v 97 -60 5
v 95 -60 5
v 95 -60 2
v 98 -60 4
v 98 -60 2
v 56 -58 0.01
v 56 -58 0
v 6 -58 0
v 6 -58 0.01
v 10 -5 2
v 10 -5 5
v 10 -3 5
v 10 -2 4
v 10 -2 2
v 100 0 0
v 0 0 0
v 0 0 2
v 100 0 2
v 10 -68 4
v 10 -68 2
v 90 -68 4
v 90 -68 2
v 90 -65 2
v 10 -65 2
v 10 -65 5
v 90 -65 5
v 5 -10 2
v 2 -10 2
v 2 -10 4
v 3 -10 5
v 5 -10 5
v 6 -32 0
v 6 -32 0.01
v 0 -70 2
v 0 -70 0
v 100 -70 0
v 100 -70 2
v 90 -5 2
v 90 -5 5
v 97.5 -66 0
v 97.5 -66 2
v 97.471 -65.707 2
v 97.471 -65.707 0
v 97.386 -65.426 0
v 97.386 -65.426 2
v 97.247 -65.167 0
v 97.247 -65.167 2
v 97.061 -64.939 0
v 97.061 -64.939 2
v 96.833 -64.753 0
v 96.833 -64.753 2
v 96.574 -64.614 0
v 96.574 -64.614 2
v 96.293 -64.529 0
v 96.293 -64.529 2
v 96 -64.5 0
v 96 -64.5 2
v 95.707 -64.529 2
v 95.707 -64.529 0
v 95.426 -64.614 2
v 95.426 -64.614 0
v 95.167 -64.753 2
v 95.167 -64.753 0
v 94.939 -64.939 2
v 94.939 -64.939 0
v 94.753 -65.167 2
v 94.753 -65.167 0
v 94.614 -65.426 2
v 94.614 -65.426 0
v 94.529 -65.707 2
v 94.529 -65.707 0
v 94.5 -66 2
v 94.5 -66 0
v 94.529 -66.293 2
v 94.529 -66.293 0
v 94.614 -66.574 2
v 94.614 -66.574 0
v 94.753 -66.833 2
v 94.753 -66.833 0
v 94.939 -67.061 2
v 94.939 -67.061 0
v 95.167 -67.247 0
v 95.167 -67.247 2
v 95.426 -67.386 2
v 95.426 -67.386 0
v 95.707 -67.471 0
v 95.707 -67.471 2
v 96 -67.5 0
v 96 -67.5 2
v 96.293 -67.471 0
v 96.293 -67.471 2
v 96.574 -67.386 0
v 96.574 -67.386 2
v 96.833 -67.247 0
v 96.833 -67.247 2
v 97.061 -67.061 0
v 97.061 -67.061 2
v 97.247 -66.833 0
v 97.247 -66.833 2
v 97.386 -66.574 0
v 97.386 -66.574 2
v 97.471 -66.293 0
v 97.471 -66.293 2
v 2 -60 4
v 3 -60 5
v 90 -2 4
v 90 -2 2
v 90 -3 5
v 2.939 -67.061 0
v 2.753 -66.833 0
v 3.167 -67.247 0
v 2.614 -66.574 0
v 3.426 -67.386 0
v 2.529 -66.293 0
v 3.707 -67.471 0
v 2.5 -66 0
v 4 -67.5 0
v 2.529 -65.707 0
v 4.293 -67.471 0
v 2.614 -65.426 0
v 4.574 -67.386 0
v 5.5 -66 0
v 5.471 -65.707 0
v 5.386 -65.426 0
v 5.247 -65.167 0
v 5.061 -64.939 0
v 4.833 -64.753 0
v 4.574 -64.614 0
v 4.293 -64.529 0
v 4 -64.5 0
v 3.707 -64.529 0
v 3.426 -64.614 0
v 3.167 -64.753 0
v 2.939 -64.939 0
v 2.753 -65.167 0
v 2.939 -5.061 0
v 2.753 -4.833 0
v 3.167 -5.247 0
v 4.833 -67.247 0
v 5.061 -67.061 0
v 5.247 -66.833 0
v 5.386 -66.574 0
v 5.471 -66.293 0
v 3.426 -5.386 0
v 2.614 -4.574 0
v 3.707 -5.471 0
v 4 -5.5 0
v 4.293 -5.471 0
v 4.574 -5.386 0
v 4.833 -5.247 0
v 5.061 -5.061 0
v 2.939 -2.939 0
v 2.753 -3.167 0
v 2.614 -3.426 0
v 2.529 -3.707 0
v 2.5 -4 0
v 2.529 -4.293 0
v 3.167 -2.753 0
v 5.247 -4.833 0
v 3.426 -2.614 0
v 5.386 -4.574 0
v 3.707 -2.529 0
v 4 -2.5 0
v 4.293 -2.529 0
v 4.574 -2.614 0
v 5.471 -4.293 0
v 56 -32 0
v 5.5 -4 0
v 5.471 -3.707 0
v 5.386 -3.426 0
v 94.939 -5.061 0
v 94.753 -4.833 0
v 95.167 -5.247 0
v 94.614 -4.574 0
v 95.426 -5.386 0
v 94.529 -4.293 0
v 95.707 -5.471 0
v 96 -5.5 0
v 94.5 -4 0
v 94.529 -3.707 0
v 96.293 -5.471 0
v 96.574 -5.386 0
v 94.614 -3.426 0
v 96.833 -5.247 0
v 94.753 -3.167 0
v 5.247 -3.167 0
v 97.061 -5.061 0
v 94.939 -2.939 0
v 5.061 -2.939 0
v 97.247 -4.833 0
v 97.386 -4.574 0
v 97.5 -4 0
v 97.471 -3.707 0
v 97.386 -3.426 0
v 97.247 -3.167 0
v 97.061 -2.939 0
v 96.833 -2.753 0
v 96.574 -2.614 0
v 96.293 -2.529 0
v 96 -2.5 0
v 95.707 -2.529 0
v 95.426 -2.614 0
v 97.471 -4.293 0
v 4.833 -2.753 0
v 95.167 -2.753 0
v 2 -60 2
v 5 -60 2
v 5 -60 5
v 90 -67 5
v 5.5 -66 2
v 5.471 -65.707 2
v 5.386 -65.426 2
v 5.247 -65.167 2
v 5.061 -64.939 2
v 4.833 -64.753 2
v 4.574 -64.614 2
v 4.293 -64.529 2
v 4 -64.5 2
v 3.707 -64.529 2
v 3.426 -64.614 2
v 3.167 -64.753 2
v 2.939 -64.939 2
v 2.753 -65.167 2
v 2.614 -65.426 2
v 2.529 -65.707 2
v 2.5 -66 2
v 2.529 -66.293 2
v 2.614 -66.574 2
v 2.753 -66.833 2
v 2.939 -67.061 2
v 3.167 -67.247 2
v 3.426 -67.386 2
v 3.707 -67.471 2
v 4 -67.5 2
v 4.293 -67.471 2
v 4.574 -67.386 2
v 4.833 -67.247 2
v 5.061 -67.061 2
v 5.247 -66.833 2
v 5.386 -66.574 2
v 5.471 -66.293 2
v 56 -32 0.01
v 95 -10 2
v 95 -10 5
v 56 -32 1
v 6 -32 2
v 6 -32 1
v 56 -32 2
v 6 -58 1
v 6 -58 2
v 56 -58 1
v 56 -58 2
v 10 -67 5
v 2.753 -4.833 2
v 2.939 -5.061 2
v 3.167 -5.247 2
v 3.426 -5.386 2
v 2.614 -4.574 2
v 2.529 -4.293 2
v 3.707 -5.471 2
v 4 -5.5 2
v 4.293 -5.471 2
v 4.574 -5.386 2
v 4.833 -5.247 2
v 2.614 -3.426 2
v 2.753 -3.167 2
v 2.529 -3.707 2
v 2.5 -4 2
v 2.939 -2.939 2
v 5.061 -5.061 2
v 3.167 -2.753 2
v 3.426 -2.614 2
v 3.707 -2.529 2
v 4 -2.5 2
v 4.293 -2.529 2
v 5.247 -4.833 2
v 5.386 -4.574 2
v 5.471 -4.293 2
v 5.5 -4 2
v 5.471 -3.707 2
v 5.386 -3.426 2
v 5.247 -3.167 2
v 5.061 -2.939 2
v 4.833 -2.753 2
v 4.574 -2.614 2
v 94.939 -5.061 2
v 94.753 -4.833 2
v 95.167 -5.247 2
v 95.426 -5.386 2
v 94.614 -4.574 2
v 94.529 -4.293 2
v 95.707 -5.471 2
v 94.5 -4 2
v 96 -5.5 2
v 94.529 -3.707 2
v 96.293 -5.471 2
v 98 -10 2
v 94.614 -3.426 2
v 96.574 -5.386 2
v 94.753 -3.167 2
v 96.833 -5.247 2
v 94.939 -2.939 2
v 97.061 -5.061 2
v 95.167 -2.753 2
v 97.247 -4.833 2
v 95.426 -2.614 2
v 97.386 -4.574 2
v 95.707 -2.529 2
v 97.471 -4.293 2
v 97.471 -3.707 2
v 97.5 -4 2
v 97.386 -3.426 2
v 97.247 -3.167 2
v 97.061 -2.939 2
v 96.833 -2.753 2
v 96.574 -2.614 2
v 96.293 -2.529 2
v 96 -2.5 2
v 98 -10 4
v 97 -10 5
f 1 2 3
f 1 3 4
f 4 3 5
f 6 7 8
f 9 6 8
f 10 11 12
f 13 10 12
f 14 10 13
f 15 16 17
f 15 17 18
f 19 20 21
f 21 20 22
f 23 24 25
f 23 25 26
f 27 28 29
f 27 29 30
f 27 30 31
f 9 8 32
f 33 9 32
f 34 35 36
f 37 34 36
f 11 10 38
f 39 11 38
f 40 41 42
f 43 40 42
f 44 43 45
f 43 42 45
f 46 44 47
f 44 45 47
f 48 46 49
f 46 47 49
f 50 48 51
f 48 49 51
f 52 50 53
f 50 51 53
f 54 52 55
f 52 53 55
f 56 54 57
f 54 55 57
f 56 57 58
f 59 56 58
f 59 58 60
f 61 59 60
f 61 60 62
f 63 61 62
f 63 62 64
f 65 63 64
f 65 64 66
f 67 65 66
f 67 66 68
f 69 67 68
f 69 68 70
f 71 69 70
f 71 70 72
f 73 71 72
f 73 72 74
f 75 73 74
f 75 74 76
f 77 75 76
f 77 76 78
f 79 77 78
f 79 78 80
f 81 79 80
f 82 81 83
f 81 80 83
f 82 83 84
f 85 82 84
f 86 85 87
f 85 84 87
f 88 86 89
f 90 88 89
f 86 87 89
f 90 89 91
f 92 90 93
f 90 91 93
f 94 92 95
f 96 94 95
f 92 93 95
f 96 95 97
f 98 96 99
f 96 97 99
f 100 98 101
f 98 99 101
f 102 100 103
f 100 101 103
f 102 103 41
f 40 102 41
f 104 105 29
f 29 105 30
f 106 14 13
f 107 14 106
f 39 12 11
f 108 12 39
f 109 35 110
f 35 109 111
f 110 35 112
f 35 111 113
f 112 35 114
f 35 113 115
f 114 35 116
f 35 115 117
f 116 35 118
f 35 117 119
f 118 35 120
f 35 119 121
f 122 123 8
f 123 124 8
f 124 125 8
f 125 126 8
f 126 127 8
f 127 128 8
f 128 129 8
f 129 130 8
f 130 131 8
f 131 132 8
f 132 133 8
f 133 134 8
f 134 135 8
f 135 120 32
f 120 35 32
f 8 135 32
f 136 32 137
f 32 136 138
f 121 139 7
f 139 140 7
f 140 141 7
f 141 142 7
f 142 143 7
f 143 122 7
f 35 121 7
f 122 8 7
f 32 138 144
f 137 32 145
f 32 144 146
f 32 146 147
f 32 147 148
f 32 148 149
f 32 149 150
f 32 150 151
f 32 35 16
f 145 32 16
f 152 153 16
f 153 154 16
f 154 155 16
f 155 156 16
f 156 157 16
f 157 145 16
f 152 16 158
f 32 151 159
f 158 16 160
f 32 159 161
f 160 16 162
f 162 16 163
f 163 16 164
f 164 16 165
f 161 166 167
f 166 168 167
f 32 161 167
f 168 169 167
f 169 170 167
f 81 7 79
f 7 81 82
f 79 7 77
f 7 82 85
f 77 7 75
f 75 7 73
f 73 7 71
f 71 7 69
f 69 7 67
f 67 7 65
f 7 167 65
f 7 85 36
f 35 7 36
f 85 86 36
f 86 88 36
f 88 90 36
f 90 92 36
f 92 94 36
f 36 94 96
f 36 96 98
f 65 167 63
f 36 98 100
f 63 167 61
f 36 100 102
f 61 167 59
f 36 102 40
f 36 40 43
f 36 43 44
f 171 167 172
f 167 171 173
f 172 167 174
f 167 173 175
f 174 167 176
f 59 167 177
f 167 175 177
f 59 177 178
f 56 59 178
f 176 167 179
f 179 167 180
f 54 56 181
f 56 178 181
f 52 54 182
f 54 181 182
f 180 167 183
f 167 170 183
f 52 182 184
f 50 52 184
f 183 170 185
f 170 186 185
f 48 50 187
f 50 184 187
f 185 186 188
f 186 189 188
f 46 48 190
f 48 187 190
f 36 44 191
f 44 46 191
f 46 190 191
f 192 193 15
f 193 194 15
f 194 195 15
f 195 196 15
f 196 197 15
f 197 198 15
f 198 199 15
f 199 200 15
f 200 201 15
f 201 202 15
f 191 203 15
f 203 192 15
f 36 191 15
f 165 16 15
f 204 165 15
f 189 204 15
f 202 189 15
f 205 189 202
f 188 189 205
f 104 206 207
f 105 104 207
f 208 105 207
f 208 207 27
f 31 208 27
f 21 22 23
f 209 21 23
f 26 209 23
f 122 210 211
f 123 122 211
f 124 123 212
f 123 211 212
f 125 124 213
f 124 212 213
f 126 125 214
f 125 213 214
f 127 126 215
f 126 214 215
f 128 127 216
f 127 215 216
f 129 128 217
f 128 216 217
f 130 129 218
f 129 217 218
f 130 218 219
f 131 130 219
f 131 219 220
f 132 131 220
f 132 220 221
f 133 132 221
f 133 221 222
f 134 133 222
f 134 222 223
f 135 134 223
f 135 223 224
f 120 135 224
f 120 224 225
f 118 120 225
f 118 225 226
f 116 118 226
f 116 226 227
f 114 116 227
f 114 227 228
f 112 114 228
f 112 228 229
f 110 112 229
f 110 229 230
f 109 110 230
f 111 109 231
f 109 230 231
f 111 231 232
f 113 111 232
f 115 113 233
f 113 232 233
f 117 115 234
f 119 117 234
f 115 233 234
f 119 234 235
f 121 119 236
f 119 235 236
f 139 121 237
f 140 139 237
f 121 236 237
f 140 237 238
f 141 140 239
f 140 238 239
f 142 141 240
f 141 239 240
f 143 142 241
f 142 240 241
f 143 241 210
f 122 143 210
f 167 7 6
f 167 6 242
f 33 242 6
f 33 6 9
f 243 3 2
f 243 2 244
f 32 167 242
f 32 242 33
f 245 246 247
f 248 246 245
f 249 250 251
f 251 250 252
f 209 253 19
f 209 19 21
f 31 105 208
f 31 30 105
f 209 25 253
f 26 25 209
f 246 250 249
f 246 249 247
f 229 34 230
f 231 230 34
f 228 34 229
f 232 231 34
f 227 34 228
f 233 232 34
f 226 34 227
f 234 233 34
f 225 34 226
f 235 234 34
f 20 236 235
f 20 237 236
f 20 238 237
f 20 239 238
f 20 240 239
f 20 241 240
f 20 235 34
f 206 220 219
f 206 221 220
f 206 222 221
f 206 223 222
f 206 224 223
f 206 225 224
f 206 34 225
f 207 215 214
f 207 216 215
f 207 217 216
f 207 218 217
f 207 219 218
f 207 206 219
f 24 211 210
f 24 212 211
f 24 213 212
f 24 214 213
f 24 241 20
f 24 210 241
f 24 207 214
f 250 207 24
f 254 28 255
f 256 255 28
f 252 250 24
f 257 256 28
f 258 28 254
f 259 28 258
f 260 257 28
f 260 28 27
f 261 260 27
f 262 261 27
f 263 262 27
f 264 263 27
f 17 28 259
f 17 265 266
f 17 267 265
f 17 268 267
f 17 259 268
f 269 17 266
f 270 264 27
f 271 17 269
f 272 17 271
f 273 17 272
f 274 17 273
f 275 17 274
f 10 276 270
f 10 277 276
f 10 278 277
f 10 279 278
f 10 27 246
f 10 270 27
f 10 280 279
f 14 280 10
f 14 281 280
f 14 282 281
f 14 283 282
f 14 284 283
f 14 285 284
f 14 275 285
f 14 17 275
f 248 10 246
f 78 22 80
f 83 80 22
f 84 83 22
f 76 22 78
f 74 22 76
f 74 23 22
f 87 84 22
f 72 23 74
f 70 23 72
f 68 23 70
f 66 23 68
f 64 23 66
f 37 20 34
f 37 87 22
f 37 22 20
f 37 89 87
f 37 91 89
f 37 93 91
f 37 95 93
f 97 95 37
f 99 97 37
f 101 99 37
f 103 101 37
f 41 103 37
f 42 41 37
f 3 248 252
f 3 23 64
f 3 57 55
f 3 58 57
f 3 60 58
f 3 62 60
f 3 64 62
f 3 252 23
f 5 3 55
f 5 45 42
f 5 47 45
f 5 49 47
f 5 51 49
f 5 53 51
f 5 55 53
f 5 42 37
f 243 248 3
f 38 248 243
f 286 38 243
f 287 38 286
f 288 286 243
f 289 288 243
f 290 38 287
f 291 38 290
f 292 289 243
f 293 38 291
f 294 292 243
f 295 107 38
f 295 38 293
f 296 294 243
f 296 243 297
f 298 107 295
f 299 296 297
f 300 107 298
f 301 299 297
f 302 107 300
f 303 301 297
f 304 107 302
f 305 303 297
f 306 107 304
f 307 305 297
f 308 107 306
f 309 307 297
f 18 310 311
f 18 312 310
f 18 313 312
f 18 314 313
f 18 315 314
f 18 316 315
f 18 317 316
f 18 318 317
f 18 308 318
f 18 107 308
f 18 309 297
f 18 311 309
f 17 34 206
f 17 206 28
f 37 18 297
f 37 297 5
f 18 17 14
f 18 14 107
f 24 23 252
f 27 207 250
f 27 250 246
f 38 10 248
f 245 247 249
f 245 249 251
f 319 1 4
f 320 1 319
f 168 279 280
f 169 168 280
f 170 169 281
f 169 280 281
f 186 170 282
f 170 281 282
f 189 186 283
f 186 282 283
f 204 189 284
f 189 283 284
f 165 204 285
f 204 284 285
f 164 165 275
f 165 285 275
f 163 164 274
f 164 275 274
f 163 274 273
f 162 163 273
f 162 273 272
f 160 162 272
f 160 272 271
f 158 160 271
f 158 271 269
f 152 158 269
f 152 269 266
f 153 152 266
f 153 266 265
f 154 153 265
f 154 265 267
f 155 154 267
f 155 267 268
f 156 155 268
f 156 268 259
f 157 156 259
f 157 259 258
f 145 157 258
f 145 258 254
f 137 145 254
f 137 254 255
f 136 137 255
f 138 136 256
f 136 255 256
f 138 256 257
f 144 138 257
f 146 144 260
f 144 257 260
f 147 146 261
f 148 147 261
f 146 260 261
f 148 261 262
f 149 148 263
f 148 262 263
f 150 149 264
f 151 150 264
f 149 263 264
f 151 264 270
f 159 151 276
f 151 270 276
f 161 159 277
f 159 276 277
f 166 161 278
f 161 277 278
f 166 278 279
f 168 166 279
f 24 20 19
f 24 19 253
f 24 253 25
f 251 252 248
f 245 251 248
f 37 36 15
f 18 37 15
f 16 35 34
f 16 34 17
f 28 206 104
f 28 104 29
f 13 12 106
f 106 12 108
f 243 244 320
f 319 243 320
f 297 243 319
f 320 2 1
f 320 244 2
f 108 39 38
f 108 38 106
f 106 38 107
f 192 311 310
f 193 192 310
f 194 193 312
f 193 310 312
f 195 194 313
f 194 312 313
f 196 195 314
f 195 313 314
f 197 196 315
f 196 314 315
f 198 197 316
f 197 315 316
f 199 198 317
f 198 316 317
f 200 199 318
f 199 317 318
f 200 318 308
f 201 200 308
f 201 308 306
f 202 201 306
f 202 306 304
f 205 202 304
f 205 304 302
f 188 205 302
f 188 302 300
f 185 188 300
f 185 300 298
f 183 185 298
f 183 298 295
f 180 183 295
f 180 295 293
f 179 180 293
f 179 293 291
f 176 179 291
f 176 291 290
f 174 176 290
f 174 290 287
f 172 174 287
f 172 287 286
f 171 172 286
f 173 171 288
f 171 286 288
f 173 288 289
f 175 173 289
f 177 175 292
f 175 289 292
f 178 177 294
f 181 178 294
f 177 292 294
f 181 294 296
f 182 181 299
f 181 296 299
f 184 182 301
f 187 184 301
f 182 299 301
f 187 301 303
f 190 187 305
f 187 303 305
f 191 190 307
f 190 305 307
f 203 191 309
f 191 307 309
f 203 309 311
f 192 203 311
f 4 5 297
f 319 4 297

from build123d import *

# Parameters (mm, degrees)
SKIZZE1_W                       = 100
SKIZZE1_H                       = 70
AUFSATZ_LINEAR_AUSTRAGEN1_DEPTH = 2
SKIZZE2_W                       = 80
SKIZZE2_H                       = 3
SKIZZE2_W_2                     = 3
SKIZZE2_H_2                     = 50
AUFSATZ_LINEAR_AUSTRAGEN2_DEPTH = 3
FASE1_SIZE                      = 1
SKIZZE3_R                       = 1.5
SCHNITT_LINEAR_AUSTRAGEN1_DEPTH = 123.102416029
SKIZZE4_W                       = 50
SKIZZE4_H                       = 26
SCHNITT_LINEAR_AUSTRAGEN2_DEPTH = 0.01
SKIZZE6_W                       = 50
SKIZZE6_H                       = 26
SCHNITT_LINEAR_AUSTRAGEN3_DEPTH = 1


with BuildPart() as part:
    # Skizze1 → Aufsatz-Linear austragen1 (new body)
    with BuildSketch(Plane.XY):
        with Locations((50, -35)):
            Rectangle(SKIZZE1_W, SKIZZE1_H)
    extrude(amount=AUFSATZ_LINEAR_AUSTRAGEN1_DEPTH)

    # Skizze2 → Aufsatz-Linear austragen2 (add)
    with BuildSketch(Plane.XY.offset(2)):
        with Locations((50, -3.5)):
            Rectangle(SKIZZE2_W, SKIZZE2_H)
        with Locations((50, -66.5)):
            Rectangle(SKIZZE2_W, SKIZZE2_H)
        with Locations((96.5, -35)):
            Rectangle(SKIZZE2_W_2, SKIZZE2_H_2)
        with Locations((3.5, -35)):
            Rectangle(SKIZZE2_W_2, SKIZZE2_H_2)
    extrude(amount=AUFSATZ_LINEAR_AUSTRAGEN2_DEPTH)

    # Fase1
    fase1_edges = [part.edges().sort_by_distance(p)[0] for p in [
        (50, -2, 5),
        (50, -68, 5),
        (98, -35, 5),
        (2, -35, 5),
    ]]
    chamfer(fase1_edges, length=FASE1_SIZE)

    # Skizze3 → Schnitt-Linear austragen1 (cut, through all)
    with BuildSketch(Plane.XY.offset(2)):
        with Locations((4, -4)):
            Circle(SKIZZE3_R)
        with Locations((96, -4)):
            Circle(SKIZZE3_R)
        with Locations((96, -66)):
            Circle(SKIZZE3_R)
        with Locations((4, -66)):
            Circle(SKIZZE3_R)
    extrude(amount=-SCHNITT_LINEAR_AUSTRAGEN1_DEPTH, mode=Mode.SUBTRACT)

    # Skizze4 → Schnitt-Linear austragen2 (cut)
    with BuildSketch(Plane(origin=(0, 0, 0), x_dir=(-1, 0, 0), z_dir=(0, 0, -1))):
        with Locations((-31, -45)):
            Rectangle(SKIZZE4_W, SKIZZE4_H)
    extrude(amount=-SCHNITT_LINEAR_AUSTRAGEN2_DEPTH, mode=Mode.SUBTRACT)

    # Skizze6 → Schnitt-Linear austragen3 (cut)
    with BuildSketch(Plane.XY.offset(2)):
        with Locations((31, -45)):
            Rectangle(SKIZZE6_W, SKIZZE6_H)
    extrude(amount=-SCHNITT_LINEAR_AUSTRAGEN3_DEPTH, mode=Mode.SUBTRACT)


solid = part.part
